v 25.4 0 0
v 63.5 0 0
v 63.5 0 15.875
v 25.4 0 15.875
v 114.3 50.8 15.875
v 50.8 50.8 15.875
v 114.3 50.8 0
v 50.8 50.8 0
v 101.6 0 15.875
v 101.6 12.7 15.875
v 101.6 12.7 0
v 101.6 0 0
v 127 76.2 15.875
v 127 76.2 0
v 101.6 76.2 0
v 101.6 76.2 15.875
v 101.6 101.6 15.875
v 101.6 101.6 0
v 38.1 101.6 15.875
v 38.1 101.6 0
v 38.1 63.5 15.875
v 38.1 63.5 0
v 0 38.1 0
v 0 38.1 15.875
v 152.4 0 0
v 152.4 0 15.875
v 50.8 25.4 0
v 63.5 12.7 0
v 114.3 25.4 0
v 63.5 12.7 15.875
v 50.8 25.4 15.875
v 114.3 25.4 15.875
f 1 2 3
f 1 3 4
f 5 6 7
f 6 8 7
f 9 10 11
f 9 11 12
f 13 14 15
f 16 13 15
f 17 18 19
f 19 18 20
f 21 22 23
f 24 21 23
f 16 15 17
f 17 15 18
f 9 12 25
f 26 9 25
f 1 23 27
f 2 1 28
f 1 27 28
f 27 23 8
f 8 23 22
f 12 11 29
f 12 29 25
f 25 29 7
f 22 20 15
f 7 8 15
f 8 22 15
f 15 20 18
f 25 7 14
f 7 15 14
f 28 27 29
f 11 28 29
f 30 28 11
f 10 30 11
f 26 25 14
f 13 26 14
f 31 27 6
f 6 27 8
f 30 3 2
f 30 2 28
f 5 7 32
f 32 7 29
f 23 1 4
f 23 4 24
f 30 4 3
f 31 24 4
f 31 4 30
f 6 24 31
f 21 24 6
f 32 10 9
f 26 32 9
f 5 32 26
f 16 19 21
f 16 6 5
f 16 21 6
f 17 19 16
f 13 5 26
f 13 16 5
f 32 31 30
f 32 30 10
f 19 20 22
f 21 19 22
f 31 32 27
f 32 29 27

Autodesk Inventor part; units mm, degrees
ref_plane "YZ Plane" through (0, 0, 0) normal (1, 0, 0) x (0, 1, 0)
ref_plane "XZ Plane" through (0, 0, 0) normal (0, 1, 0) x (-1, 0, 0)
ref_plane "XY Plane" through (0, 0, 0) normal (0, 0, 1) x (1, 0, 0)
sketch "Sketch1" plane through (0, 0, 0) normal (0, 0, 1) x (1, 0, 0)
  line L0 (25.4, 0) -> (0, 38.1)
  line L1 (63.5, 0) -> (25.4, 0)
  line L2 (63.5, 0) -> (63.5, 12.7)
  line L3 (63.5, 12.7) -> (101.6, 12.7)
  line L4 (101.6, 12.7) -> (101.6, 0)
  line L5 (50.8, 25.4) -> (50.8, 50.8)
  line L6 (50.8, 50.8) -> (114.3, 50.8)
  line L7 (114.3, 50.8) -> (114.3, 25.4)
  line L8 (114.3, 25.4) -> (50.8, 25.4)
  line L9 (101.6, 0) -> (152.4, 0)
  line L10 (152.4, 0) -> (127, 76.2)
  line L11 (127, 76.2) -> (101.6, 76.2)
  line L12 (101.6, 76.2) -> (101.6, 101.6)
  line L13 (101.6, 101.6) -> (38.1, 101.6)
  line L14 (38.1, 101.6) -> (38.1, 63.5)
  line L15 (38.1, 63.5) -> (0, 38.1)
  point P0 (0, 0)
extrude "Extrusion1" add sketch "Sketch1" along normal blind 15.875
properties part number "P2-2"
